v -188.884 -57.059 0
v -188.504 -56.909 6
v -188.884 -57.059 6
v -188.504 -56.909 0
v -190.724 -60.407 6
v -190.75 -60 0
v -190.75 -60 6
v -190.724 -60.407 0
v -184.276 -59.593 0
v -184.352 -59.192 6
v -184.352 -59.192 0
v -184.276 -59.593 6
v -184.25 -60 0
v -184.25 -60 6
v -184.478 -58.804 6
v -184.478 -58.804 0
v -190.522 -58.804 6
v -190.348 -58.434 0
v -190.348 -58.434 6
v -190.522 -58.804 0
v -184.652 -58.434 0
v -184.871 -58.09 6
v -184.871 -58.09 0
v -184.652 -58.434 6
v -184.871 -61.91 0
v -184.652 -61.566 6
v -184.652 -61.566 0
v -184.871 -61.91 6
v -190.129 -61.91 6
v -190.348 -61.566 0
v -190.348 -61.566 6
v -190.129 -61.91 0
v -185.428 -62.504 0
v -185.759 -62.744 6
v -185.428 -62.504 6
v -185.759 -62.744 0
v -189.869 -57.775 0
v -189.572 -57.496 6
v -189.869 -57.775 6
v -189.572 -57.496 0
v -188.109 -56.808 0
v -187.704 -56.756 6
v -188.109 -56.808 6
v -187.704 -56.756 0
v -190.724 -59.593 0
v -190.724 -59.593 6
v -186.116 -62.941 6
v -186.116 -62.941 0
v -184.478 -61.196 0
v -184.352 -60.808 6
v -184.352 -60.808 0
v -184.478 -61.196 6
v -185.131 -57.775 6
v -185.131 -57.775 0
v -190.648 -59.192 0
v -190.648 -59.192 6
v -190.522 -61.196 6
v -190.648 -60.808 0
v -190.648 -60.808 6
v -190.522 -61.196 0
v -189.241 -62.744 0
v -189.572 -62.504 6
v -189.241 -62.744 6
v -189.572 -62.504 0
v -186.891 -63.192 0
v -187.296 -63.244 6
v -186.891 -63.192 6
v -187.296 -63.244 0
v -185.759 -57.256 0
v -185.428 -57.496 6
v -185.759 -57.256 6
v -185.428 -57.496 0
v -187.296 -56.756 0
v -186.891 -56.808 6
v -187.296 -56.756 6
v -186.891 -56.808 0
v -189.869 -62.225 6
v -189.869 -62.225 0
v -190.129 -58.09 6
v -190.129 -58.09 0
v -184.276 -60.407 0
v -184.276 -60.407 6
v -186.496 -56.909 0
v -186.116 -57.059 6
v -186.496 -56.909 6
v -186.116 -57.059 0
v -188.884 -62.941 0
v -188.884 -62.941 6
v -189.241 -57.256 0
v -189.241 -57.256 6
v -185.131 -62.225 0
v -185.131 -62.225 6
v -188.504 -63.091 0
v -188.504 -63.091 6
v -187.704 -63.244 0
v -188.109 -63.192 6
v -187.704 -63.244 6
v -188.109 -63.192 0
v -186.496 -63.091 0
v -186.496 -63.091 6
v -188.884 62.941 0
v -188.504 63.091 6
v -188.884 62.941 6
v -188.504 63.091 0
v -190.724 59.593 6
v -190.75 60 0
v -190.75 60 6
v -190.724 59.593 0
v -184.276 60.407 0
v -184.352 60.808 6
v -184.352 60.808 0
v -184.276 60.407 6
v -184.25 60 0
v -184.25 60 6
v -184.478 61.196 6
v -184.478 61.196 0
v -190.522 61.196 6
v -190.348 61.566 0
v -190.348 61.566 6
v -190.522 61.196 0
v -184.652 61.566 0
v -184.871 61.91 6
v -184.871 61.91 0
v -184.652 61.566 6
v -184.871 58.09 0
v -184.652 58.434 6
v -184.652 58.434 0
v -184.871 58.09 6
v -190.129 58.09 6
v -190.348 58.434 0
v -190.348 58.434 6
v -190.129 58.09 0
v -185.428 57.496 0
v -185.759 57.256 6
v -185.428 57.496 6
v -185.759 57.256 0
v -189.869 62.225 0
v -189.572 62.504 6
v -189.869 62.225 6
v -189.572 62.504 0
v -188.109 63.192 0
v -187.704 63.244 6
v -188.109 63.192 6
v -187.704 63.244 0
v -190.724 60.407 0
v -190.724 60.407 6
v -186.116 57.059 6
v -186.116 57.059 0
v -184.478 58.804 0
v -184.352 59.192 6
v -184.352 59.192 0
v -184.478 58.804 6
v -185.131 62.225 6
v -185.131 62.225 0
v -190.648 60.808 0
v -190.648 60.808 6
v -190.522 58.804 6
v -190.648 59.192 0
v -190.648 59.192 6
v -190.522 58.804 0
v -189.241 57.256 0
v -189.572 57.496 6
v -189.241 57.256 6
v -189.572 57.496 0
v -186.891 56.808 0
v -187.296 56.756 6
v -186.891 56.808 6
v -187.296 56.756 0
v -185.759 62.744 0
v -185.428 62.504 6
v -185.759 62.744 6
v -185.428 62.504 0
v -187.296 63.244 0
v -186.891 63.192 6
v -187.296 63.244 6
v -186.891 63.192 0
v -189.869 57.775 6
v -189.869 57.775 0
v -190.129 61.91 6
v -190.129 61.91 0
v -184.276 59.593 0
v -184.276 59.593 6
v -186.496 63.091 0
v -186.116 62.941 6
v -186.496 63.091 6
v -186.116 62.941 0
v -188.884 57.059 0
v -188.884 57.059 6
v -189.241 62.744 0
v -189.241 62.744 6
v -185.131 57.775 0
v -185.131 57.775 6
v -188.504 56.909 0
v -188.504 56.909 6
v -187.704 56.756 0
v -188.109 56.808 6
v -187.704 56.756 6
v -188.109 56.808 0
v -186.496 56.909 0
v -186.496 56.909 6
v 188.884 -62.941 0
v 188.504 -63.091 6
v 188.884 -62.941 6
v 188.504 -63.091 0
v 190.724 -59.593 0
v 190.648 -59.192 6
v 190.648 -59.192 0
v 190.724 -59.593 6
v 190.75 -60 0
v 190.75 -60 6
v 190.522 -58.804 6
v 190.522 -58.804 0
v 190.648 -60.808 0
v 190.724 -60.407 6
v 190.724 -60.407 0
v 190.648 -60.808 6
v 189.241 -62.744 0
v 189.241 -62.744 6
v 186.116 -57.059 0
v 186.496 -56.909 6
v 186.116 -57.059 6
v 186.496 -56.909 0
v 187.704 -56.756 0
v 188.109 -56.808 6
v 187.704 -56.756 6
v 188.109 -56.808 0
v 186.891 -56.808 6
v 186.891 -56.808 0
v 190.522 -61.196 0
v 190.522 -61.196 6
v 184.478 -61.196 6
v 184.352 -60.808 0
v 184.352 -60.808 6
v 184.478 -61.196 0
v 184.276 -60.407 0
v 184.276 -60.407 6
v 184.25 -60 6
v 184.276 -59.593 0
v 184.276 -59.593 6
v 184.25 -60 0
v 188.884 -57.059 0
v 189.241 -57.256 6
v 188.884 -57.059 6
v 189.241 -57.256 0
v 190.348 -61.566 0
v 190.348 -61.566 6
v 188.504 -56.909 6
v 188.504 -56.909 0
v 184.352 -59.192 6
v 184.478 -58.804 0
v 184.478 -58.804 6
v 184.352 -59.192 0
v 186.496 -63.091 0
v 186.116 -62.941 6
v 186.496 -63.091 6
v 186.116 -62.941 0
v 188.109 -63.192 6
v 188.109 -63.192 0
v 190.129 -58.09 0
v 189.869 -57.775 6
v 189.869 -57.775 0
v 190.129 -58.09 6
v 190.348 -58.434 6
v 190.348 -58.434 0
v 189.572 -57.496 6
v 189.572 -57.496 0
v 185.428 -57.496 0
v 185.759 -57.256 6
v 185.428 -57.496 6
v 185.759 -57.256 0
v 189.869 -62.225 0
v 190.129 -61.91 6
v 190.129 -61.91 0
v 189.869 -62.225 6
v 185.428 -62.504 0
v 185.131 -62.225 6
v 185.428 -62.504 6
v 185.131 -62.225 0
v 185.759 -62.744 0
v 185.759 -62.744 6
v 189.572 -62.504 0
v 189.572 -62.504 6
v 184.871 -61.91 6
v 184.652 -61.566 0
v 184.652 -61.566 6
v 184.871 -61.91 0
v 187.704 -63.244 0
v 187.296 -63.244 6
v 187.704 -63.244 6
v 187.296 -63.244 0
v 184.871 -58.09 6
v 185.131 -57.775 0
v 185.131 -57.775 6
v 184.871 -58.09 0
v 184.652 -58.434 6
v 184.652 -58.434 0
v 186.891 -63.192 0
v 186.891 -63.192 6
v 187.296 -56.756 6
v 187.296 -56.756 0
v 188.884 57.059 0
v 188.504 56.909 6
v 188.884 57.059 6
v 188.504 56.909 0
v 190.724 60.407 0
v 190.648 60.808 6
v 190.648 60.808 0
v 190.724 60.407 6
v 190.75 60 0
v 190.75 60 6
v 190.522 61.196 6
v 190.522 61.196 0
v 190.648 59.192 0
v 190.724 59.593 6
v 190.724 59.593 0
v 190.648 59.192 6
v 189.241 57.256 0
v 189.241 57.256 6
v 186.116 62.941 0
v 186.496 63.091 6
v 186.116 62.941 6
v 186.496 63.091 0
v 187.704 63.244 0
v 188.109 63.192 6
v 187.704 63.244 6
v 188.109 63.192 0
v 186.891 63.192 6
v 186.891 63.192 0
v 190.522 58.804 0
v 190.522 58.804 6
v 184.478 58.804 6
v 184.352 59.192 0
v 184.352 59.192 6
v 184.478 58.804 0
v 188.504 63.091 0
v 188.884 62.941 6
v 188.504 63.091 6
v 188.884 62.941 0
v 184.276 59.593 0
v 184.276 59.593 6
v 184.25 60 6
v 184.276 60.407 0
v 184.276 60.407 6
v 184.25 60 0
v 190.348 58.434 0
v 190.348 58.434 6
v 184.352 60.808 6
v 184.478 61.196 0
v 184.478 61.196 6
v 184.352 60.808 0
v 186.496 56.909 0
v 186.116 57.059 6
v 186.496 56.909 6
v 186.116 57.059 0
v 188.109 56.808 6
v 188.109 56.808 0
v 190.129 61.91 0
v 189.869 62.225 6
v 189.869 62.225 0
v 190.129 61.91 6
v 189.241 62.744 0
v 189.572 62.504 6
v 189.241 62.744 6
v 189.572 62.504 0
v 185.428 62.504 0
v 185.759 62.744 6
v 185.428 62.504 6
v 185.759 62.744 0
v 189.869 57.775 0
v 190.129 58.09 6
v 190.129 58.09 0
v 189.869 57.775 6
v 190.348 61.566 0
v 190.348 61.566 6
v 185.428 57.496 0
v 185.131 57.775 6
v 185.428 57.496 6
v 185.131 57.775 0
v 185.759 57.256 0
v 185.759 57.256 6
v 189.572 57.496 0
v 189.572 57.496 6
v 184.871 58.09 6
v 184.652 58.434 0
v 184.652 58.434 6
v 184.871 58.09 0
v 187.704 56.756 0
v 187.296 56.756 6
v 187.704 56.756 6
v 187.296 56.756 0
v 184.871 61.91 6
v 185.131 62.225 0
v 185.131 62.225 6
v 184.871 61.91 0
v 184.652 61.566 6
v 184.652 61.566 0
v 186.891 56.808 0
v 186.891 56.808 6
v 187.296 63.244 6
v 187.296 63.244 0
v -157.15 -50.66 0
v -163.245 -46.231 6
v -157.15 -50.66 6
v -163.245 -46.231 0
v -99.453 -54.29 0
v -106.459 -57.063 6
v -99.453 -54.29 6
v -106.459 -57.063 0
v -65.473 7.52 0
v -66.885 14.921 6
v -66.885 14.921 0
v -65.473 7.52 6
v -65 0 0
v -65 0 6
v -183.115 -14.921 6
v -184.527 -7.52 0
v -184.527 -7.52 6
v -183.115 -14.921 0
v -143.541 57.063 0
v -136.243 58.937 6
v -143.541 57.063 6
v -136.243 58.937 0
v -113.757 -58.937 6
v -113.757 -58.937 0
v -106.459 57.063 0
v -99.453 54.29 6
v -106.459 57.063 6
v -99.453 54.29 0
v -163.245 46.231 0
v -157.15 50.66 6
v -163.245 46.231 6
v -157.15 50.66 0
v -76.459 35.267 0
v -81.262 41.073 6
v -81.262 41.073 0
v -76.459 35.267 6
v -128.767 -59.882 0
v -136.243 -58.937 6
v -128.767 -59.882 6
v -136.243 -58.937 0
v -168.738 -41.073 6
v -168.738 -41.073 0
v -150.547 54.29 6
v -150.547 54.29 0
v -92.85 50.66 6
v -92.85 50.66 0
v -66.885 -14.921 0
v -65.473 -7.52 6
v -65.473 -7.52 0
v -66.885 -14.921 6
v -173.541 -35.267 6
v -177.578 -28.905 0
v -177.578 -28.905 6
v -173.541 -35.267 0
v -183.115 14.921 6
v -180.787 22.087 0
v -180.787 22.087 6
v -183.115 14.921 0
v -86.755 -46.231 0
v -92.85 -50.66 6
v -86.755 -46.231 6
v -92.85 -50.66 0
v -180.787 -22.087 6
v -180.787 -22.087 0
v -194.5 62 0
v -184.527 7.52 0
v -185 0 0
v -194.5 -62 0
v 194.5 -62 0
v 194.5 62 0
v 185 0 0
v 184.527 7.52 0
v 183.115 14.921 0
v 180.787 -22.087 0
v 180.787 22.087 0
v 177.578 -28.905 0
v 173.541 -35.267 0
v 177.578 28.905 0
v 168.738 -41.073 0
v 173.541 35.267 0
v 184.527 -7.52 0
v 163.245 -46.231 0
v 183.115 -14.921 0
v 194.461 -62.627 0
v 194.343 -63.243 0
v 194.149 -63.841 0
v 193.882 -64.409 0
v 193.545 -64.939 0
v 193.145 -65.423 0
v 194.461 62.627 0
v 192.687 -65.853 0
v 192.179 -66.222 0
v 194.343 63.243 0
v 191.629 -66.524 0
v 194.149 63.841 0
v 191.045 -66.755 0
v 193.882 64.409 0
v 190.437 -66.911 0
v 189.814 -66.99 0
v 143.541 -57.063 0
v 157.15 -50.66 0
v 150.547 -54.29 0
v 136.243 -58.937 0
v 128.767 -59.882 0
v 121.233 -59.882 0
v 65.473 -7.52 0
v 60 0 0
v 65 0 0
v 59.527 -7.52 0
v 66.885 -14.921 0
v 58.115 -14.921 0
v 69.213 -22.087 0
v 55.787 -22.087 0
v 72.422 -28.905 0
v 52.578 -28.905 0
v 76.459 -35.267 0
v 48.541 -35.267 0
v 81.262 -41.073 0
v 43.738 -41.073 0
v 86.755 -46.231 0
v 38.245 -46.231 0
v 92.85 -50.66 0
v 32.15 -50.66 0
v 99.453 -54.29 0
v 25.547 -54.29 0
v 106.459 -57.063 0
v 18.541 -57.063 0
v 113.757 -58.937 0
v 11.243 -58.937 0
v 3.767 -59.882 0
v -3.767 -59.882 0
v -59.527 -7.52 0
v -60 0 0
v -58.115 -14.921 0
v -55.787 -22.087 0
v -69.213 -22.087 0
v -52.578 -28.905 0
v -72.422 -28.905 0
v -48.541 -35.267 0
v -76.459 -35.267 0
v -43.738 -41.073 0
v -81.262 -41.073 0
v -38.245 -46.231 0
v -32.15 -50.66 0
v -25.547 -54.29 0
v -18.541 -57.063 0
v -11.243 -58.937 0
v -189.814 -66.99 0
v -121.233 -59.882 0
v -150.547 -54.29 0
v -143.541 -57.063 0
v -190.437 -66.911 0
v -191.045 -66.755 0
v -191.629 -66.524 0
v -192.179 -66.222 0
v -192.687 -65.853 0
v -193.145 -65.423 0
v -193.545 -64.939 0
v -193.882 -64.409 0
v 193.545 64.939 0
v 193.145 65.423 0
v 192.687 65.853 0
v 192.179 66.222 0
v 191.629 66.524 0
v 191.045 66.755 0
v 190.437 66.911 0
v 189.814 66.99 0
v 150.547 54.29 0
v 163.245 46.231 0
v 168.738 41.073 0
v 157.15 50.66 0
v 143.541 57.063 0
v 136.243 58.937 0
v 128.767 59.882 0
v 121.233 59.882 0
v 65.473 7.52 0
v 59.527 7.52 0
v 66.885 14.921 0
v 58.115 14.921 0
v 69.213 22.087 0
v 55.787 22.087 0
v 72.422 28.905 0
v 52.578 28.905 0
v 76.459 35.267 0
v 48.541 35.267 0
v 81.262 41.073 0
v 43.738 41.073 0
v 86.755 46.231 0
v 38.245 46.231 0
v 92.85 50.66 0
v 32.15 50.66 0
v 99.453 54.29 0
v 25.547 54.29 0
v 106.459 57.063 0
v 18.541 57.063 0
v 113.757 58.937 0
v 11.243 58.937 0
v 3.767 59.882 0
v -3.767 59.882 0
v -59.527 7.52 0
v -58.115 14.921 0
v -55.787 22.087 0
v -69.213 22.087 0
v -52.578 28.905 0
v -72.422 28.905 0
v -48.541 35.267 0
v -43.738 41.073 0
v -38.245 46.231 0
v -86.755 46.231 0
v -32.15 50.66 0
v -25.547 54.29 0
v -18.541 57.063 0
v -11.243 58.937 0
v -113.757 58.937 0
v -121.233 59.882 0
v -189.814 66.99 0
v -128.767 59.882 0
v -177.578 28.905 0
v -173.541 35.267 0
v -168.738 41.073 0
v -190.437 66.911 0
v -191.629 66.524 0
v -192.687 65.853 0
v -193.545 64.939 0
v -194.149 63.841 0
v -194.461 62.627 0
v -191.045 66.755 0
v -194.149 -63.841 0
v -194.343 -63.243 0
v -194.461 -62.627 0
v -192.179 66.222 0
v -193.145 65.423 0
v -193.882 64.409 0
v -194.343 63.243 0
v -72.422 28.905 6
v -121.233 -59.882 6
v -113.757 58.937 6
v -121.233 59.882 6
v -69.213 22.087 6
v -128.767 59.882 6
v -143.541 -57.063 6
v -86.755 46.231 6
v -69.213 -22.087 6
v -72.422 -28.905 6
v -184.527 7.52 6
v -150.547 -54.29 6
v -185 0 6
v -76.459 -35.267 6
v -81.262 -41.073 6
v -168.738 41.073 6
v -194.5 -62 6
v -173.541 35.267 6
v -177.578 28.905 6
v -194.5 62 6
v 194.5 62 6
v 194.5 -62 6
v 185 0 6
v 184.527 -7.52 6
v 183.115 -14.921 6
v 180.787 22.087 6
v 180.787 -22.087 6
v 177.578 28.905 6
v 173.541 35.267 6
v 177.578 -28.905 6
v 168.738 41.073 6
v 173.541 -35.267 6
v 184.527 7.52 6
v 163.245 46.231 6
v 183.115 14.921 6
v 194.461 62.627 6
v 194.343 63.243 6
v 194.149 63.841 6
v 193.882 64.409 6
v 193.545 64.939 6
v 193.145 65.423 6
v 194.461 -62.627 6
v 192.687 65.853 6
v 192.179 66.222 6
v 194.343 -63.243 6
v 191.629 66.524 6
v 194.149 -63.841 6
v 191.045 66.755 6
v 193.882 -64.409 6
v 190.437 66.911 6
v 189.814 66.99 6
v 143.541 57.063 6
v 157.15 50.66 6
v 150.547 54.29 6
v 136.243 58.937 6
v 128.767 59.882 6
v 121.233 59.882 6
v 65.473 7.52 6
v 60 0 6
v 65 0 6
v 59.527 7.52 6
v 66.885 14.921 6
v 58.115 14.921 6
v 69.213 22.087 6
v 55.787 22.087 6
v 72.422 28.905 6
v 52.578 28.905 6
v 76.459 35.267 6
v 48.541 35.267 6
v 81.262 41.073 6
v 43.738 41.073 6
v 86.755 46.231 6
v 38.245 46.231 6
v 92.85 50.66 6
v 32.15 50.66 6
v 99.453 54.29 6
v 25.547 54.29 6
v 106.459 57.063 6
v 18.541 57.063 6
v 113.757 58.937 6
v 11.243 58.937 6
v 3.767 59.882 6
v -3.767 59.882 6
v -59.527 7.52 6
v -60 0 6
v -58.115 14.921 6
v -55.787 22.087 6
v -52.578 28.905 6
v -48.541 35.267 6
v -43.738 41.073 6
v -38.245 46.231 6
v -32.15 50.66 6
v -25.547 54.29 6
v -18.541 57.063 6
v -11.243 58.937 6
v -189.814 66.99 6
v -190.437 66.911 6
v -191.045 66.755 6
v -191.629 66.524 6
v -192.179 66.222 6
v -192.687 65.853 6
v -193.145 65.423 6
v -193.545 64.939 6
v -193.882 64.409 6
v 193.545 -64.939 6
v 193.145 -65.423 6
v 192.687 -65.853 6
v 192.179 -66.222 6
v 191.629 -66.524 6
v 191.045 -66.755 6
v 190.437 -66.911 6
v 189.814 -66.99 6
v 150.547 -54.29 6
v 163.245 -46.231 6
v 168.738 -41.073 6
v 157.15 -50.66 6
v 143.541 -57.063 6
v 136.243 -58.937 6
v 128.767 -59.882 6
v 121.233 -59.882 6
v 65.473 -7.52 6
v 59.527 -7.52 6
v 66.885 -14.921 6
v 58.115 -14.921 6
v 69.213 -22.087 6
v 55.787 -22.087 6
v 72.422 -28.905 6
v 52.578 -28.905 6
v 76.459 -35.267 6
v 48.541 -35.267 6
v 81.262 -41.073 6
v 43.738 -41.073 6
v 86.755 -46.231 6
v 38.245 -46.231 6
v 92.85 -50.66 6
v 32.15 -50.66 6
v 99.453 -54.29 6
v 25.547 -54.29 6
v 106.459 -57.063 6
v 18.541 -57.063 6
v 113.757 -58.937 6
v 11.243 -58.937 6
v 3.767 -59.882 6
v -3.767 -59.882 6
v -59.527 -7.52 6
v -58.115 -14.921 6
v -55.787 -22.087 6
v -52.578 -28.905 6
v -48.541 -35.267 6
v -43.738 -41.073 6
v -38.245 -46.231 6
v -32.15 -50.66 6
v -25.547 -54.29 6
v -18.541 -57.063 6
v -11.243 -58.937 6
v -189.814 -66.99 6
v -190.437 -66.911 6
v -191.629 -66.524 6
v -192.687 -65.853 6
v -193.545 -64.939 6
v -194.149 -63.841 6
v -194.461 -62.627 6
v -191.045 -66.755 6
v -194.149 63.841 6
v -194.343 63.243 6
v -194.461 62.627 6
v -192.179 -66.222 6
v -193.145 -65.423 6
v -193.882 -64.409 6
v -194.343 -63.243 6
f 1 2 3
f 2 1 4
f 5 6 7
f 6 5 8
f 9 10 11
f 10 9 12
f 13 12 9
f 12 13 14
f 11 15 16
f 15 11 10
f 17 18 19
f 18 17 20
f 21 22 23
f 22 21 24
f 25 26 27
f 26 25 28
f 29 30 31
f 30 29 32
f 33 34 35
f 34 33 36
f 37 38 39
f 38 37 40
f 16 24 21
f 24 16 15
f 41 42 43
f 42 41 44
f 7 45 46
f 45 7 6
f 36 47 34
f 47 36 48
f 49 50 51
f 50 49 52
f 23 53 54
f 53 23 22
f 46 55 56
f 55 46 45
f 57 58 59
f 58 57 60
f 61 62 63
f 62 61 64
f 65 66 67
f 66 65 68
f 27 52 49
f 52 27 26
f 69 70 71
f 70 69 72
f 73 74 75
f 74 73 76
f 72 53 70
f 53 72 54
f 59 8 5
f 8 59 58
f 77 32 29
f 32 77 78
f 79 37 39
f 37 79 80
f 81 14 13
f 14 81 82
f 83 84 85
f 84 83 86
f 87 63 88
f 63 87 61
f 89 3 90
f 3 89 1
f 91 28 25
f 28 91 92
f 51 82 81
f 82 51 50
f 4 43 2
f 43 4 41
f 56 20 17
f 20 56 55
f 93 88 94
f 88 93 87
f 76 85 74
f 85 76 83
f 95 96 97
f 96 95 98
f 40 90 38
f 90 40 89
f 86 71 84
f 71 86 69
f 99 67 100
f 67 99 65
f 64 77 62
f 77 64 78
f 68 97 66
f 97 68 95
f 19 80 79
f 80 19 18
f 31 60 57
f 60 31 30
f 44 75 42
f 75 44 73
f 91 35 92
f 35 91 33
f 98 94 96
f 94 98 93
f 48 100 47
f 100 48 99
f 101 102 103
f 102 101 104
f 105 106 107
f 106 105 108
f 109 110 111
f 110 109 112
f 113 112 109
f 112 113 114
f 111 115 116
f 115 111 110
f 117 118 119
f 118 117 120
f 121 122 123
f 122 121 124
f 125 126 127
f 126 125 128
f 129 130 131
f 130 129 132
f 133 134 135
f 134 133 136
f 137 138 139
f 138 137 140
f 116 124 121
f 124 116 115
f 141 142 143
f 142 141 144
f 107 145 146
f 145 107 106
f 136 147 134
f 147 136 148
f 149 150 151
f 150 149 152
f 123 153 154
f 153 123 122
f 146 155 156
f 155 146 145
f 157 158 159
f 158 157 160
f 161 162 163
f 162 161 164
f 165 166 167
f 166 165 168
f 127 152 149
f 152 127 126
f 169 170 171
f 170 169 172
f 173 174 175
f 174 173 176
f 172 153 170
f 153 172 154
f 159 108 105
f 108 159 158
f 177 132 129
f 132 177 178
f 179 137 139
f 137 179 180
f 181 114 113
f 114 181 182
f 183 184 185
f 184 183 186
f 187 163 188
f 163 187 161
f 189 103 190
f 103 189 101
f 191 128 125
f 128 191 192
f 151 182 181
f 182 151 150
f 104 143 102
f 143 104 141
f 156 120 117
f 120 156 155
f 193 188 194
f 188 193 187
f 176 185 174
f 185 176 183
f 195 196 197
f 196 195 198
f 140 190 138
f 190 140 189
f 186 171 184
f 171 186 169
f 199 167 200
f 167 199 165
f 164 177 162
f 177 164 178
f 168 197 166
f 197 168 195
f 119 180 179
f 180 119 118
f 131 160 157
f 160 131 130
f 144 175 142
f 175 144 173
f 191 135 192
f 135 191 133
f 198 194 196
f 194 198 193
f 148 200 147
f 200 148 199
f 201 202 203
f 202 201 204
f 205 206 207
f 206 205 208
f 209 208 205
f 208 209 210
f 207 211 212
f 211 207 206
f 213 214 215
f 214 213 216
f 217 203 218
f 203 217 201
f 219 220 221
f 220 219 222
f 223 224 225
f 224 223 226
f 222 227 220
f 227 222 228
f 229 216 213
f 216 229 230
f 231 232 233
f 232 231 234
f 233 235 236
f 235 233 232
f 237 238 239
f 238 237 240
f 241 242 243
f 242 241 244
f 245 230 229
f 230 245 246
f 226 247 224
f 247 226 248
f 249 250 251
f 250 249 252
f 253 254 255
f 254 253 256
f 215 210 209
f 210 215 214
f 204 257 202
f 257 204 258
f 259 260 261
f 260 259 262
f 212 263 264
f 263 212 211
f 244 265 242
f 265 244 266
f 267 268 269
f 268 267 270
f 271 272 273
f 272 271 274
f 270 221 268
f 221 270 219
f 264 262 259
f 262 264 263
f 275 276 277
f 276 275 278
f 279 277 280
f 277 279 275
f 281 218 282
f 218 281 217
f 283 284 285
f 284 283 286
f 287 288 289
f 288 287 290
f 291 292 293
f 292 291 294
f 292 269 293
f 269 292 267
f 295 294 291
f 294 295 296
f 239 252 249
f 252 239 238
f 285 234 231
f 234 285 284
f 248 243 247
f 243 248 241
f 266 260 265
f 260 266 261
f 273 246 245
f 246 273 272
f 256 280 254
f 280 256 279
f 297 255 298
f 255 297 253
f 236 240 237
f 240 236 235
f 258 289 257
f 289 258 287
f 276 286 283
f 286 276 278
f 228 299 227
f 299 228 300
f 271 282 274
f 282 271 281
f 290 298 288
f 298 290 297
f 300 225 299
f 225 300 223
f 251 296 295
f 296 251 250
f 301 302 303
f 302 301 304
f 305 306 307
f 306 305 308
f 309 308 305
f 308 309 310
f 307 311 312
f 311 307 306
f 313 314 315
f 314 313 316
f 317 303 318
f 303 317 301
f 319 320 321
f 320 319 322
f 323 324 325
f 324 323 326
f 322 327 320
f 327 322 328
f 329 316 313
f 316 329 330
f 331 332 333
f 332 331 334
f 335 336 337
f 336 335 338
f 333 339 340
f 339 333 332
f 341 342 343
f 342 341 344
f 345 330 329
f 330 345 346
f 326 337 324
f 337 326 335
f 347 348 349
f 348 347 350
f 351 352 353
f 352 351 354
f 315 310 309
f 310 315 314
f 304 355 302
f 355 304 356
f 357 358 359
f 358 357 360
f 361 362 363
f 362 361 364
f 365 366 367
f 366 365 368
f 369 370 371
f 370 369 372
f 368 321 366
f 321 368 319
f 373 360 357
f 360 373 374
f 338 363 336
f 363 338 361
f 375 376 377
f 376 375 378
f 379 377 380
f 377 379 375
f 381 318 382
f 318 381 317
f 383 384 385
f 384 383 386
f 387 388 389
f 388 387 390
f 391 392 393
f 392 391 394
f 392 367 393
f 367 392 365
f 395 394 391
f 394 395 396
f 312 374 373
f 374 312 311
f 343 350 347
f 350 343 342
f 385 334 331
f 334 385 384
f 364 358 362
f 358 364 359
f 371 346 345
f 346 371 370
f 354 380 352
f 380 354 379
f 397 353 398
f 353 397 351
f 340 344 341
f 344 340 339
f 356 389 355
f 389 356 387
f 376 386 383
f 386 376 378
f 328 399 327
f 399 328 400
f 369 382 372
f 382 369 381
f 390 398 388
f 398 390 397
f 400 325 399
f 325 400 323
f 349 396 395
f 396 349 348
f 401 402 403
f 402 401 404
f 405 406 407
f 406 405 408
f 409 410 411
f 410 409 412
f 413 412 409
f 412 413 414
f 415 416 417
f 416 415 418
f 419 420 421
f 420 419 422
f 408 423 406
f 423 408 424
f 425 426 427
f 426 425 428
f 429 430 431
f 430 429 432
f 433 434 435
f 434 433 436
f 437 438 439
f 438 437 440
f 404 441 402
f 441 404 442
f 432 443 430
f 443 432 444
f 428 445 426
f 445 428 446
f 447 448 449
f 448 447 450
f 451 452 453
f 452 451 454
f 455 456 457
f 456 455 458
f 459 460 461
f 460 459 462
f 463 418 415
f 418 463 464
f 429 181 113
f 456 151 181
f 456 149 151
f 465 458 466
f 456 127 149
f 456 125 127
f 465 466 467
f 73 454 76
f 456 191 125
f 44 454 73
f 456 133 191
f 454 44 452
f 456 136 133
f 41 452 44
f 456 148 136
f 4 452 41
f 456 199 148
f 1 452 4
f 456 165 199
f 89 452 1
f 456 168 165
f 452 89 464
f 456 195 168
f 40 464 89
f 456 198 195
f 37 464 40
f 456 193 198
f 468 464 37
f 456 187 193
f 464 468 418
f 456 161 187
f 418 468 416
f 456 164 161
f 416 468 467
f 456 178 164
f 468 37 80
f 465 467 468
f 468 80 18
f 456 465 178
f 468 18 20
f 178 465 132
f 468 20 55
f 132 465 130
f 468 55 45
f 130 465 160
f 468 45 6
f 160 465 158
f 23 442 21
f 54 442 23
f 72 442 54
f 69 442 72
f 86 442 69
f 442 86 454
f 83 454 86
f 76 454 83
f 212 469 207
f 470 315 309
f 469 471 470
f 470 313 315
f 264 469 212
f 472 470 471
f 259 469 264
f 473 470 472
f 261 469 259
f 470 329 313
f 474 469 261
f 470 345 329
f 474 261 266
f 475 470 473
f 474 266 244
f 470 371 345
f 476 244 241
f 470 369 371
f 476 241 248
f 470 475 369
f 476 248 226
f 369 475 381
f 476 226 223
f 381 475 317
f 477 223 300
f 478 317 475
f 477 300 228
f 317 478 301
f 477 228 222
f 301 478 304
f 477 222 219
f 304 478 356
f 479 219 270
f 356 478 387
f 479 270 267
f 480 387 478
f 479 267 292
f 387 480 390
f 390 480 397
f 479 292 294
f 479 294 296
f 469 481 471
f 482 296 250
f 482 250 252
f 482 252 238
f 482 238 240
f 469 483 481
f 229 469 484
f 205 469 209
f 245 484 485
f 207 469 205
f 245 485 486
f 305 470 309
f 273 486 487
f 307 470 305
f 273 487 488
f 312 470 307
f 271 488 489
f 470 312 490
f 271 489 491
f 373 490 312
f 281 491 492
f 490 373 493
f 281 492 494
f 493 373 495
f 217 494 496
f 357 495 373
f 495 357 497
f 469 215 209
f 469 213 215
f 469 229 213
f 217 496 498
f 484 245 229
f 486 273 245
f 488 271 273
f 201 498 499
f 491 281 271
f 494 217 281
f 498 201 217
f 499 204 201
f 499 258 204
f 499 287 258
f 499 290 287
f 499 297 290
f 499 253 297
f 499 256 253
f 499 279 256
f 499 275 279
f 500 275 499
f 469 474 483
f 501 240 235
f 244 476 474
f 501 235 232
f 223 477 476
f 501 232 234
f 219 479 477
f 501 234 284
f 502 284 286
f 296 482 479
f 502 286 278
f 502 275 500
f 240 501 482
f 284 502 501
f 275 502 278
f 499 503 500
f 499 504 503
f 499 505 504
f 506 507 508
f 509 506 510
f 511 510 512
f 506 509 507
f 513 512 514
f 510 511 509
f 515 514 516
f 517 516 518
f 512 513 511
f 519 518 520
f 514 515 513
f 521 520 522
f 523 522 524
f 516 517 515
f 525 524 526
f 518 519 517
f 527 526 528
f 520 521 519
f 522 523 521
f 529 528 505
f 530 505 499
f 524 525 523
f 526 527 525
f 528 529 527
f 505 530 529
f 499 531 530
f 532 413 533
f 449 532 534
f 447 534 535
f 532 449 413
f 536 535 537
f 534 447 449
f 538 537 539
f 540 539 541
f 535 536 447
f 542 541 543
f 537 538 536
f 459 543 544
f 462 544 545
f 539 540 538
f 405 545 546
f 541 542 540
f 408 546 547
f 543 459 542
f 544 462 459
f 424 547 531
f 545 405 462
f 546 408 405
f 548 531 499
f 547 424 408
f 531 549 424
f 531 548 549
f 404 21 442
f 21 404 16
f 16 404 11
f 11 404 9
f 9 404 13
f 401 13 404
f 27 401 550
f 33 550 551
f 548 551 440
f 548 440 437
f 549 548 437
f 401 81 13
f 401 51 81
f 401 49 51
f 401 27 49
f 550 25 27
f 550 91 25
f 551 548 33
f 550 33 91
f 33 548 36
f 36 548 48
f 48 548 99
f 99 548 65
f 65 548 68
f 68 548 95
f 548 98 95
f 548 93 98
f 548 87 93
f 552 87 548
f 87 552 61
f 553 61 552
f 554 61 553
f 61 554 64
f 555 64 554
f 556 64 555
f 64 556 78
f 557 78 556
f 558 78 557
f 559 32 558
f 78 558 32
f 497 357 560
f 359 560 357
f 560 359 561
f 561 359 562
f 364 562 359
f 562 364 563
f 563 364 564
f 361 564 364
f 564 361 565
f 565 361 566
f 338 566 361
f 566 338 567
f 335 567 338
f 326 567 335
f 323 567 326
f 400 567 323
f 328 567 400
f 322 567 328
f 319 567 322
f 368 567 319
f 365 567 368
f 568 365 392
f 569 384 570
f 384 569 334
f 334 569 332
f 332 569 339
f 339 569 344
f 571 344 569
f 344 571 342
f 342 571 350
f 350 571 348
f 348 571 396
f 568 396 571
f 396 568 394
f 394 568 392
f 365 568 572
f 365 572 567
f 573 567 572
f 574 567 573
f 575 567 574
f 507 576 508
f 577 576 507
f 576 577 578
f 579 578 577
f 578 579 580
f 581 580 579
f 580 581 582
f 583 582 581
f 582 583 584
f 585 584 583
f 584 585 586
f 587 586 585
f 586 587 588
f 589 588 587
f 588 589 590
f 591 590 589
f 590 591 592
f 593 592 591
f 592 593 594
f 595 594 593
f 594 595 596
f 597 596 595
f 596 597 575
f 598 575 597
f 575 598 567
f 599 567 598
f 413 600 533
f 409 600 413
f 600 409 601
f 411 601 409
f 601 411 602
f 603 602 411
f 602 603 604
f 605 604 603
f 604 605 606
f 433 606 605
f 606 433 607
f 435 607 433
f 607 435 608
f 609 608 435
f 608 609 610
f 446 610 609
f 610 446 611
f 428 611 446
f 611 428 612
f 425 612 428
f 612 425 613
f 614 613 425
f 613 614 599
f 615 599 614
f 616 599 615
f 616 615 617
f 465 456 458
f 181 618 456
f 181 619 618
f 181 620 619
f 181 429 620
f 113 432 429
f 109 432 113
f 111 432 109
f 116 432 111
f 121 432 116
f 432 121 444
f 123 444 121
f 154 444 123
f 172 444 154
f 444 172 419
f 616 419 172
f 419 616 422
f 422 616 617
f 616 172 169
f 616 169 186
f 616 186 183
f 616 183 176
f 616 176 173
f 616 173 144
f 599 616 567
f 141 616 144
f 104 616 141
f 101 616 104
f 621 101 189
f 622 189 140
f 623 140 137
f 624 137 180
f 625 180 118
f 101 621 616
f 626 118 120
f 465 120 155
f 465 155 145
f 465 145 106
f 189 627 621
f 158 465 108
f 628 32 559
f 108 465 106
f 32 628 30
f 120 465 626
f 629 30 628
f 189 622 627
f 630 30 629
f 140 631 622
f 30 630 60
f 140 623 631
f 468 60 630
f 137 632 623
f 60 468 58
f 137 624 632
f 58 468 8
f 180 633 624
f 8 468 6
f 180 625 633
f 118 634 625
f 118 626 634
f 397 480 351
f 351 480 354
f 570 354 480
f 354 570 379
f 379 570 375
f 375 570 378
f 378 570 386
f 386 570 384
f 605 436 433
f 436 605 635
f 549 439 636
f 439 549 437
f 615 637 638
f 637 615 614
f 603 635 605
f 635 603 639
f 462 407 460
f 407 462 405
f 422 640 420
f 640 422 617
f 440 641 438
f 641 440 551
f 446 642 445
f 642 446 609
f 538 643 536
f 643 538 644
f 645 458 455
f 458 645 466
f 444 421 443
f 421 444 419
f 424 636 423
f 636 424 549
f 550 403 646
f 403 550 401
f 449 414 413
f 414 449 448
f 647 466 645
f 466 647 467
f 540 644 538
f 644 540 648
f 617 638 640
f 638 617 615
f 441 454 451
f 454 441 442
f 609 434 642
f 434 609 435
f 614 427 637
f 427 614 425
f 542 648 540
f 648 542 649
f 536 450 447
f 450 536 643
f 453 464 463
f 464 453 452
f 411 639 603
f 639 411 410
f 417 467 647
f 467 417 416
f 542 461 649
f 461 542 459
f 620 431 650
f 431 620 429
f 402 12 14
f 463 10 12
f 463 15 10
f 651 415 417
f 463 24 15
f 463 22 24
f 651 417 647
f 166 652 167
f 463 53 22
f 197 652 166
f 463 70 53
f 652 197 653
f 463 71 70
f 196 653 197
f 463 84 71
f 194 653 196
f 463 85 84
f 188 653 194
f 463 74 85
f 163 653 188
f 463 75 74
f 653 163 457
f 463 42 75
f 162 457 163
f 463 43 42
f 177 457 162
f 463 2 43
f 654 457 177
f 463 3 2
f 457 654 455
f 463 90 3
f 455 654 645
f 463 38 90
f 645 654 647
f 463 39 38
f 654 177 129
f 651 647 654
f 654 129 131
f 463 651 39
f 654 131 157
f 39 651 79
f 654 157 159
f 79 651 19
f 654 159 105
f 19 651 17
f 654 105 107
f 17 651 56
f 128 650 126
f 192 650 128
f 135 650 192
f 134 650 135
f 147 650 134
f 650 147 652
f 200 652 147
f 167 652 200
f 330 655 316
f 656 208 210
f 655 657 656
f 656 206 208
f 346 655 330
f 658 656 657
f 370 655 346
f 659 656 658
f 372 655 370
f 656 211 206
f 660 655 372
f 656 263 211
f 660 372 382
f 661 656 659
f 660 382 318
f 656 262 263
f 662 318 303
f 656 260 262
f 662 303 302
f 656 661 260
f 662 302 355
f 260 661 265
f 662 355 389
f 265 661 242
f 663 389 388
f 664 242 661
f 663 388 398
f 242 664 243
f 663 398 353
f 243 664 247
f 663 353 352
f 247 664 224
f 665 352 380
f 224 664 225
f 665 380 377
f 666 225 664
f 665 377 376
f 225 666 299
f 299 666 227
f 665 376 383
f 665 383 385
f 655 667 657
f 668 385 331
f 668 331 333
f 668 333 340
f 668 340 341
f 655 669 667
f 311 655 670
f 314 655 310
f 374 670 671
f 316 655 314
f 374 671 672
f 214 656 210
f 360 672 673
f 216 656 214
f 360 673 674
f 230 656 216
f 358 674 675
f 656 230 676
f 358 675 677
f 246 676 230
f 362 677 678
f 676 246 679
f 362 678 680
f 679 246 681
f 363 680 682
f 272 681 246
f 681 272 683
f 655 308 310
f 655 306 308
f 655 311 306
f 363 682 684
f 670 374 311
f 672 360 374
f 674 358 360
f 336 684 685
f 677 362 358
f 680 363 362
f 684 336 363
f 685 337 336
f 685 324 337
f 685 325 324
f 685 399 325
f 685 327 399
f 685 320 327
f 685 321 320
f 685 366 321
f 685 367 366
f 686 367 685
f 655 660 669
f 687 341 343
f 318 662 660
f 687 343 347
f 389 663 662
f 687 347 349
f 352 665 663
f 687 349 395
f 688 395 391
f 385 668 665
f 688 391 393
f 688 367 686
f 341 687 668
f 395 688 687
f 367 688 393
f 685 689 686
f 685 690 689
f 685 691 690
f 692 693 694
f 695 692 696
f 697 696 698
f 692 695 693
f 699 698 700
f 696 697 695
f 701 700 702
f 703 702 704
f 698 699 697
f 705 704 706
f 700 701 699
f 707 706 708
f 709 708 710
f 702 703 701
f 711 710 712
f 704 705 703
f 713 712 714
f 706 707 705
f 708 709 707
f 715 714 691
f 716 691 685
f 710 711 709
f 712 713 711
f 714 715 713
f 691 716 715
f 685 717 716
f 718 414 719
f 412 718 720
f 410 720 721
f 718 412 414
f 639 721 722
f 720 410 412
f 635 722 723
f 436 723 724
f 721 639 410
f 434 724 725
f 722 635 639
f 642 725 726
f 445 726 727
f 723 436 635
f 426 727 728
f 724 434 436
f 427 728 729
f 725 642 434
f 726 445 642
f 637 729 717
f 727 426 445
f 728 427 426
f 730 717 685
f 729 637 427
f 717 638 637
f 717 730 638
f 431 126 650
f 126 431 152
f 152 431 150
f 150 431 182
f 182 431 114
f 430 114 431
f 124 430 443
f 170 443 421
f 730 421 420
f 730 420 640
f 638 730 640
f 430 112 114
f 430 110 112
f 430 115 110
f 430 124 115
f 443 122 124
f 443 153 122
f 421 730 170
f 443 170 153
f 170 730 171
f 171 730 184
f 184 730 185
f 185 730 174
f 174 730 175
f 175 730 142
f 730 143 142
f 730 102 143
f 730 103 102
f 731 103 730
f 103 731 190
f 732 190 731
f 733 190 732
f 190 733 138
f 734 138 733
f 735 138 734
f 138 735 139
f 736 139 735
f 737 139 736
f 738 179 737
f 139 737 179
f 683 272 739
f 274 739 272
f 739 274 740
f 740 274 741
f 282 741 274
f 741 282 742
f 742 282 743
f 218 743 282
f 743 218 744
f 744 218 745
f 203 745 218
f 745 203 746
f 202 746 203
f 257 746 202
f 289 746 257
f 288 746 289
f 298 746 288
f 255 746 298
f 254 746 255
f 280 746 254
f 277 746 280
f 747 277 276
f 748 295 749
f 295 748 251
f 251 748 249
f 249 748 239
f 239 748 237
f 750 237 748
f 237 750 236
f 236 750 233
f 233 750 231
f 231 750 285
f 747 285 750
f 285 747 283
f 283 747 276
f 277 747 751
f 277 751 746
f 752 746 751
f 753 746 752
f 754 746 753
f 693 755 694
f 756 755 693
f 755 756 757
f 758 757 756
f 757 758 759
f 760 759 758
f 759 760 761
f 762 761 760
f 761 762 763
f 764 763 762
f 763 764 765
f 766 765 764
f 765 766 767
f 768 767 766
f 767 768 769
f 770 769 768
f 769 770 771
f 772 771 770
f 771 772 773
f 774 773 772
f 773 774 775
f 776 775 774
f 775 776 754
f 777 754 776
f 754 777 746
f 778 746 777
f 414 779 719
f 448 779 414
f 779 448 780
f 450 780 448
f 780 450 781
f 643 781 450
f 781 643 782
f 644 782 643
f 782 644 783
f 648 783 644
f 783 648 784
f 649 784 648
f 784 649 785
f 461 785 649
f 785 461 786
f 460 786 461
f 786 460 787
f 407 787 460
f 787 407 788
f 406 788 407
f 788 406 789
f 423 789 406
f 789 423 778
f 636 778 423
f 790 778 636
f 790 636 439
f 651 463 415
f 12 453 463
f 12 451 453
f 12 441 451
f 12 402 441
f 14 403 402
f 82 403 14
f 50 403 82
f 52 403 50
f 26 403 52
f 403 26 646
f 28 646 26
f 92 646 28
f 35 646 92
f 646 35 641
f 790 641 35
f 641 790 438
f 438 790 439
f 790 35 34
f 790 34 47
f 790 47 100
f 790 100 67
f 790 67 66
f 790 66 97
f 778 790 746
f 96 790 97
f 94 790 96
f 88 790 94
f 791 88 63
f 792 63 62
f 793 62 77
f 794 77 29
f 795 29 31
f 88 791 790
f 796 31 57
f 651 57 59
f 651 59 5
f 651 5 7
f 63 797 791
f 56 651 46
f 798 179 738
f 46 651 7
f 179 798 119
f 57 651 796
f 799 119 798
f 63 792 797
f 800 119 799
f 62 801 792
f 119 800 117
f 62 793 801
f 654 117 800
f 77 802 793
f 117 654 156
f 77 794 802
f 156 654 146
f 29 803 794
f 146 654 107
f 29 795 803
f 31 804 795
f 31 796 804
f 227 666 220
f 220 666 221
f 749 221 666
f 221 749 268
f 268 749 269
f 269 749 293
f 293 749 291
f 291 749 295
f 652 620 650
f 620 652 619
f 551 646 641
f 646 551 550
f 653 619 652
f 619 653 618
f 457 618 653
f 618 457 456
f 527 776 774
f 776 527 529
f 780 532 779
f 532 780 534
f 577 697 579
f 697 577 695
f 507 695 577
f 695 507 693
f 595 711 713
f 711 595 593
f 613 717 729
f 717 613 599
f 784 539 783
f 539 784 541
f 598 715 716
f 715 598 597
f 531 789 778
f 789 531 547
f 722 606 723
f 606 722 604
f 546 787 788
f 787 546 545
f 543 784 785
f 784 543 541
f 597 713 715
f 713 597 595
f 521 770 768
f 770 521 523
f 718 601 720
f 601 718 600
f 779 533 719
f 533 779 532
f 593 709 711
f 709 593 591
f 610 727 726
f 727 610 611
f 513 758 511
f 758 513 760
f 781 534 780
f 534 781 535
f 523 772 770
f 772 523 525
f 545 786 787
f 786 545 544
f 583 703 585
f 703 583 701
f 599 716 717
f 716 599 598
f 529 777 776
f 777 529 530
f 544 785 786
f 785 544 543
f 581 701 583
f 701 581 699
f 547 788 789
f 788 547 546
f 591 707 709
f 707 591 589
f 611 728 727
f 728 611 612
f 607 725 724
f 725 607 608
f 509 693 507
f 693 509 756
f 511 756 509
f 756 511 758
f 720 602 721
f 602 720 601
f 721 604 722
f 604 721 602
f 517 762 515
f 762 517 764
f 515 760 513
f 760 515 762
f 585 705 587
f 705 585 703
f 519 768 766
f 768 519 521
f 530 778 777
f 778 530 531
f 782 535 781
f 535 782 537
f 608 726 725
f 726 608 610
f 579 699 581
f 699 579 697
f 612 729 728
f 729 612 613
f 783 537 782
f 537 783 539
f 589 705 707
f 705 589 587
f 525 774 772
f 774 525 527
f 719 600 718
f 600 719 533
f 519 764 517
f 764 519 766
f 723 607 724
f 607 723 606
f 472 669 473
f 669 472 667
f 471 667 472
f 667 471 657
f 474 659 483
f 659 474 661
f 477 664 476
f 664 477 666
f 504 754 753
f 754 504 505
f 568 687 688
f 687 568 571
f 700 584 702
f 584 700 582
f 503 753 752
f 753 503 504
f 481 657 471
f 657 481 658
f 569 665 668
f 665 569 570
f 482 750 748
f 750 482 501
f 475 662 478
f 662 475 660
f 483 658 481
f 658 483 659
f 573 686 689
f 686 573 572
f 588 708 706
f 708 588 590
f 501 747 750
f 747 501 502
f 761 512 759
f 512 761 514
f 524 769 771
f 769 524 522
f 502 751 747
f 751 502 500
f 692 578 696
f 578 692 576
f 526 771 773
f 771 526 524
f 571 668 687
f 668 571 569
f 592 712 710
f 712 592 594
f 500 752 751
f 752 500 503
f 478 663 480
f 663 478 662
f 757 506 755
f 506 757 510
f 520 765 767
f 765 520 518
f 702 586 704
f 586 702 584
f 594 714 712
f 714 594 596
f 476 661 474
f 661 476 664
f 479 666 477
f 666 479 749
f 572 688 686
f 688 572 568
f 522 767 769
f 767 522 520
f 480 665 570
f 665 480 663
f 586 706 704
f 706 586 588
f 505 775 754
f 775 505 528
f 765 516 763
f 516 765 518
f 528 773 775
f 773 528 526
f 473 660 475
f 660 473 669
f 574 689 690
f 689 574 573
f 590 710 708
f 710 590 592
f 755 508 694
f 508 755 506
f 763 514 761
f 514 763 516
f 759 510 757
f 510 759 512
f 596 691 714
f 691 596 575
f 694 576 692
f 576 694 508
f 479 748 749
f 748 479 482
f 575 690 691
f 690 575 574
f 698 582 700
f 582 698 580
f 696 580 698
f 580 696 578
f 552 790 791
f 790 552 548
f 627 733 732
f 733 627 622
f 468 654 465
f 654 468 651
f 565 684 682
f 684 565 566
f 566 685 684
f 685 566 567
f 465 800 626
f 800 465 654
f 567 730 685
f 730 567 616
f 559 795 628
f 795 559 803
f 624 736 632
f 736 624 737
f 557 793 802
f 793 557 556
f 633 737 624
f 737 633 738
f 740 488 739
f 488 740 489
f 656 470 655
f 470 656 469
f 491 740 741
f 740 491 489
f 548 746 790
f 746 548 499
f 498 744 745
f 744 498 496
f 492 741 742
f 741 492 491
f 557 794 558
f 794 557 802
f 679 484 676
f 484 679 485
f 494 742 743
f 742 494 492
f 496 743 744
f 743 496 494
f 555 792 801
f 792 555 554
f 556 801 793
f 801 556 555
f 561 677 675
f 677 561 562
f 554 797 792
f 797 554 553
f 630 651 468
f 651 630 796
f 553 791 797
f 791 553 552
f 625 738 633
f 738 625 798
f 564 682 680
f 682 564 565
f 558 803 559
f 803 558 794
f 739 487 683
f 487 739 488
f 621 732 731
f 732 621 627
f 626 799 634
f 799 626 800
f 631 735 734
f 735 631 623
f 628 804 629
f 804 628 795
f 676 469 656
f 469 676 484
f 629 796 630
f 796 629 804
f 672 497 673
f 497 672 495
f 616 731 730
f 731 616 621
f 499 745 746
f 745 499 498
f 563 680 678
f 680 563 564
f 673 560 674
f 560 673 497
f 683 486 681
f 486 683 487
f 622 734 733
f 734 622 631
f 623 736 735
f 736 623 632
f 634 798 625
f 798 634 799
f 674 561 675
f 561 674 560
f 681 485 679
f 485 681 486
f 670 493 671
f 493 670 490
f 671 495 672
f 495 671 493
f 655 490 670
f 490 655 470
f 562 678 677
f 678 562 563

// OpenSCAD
$fn = 50;

difference() {
	union() {
		hull() {
			translate(v = [-189.5, 62.0, 0]) {
				cylinder(h = 6, r = 5);
			}
			translate(v = [189.5, 62.0, 0]) {
				cylinder(h = 6, r = 5);
			}
			translate(v = [-189.5, -62.0, 0]) {
				cylinder(h = 6, r = 5);
			}
			translate(v = [189.5, -62.0, 0]) {
				cylinder(h = 6, r = 5);
			}
		}
	}
	union() {
		translate(v = [-187.5, -60.0, -100.0]) {
			cylinder(h = 200, r = 3.25);
		}
		translate(v = [-187.5, 60.0, -100.0]) {
			cylinder(h = 200, r = 3.25);
		}
		translate(v = [187.5, -60.0, -100.0]) {
			cylinder(h = 200, r = 3.25);
		}
		translate(v = [187.5, 60.0, -100.0]) {
			cylinder(h = 200, r = 3.25);
		}
		translate(v = [-187.5, -60.0, -100.0]) {
			cylinder(h = 200, r = 1.8);
		}
		translate(v = [-187.5, 60.0, -100.0]) {
			cylinder(h = 200, r = 1.8);
		}
		translate(v = [187.5, -60.0, -100.0]) {
			cylinder(h = 200, r = 1.8);
		}
		translate(v = [187.5, 60.0, -100.0]) {
			cylinder(h = 200, r = 1.8);
		}
		translate(v = [-125.0, 0, 0.0]) {
			cylinder(h = 6, r = 60.0);
		}
		cylinder(h = 6, r = 60.0);
		translate(v = [125.0, 0, 0.0]) {
			cylinder(h = 6, r = 60.0);
		}
	}
}
